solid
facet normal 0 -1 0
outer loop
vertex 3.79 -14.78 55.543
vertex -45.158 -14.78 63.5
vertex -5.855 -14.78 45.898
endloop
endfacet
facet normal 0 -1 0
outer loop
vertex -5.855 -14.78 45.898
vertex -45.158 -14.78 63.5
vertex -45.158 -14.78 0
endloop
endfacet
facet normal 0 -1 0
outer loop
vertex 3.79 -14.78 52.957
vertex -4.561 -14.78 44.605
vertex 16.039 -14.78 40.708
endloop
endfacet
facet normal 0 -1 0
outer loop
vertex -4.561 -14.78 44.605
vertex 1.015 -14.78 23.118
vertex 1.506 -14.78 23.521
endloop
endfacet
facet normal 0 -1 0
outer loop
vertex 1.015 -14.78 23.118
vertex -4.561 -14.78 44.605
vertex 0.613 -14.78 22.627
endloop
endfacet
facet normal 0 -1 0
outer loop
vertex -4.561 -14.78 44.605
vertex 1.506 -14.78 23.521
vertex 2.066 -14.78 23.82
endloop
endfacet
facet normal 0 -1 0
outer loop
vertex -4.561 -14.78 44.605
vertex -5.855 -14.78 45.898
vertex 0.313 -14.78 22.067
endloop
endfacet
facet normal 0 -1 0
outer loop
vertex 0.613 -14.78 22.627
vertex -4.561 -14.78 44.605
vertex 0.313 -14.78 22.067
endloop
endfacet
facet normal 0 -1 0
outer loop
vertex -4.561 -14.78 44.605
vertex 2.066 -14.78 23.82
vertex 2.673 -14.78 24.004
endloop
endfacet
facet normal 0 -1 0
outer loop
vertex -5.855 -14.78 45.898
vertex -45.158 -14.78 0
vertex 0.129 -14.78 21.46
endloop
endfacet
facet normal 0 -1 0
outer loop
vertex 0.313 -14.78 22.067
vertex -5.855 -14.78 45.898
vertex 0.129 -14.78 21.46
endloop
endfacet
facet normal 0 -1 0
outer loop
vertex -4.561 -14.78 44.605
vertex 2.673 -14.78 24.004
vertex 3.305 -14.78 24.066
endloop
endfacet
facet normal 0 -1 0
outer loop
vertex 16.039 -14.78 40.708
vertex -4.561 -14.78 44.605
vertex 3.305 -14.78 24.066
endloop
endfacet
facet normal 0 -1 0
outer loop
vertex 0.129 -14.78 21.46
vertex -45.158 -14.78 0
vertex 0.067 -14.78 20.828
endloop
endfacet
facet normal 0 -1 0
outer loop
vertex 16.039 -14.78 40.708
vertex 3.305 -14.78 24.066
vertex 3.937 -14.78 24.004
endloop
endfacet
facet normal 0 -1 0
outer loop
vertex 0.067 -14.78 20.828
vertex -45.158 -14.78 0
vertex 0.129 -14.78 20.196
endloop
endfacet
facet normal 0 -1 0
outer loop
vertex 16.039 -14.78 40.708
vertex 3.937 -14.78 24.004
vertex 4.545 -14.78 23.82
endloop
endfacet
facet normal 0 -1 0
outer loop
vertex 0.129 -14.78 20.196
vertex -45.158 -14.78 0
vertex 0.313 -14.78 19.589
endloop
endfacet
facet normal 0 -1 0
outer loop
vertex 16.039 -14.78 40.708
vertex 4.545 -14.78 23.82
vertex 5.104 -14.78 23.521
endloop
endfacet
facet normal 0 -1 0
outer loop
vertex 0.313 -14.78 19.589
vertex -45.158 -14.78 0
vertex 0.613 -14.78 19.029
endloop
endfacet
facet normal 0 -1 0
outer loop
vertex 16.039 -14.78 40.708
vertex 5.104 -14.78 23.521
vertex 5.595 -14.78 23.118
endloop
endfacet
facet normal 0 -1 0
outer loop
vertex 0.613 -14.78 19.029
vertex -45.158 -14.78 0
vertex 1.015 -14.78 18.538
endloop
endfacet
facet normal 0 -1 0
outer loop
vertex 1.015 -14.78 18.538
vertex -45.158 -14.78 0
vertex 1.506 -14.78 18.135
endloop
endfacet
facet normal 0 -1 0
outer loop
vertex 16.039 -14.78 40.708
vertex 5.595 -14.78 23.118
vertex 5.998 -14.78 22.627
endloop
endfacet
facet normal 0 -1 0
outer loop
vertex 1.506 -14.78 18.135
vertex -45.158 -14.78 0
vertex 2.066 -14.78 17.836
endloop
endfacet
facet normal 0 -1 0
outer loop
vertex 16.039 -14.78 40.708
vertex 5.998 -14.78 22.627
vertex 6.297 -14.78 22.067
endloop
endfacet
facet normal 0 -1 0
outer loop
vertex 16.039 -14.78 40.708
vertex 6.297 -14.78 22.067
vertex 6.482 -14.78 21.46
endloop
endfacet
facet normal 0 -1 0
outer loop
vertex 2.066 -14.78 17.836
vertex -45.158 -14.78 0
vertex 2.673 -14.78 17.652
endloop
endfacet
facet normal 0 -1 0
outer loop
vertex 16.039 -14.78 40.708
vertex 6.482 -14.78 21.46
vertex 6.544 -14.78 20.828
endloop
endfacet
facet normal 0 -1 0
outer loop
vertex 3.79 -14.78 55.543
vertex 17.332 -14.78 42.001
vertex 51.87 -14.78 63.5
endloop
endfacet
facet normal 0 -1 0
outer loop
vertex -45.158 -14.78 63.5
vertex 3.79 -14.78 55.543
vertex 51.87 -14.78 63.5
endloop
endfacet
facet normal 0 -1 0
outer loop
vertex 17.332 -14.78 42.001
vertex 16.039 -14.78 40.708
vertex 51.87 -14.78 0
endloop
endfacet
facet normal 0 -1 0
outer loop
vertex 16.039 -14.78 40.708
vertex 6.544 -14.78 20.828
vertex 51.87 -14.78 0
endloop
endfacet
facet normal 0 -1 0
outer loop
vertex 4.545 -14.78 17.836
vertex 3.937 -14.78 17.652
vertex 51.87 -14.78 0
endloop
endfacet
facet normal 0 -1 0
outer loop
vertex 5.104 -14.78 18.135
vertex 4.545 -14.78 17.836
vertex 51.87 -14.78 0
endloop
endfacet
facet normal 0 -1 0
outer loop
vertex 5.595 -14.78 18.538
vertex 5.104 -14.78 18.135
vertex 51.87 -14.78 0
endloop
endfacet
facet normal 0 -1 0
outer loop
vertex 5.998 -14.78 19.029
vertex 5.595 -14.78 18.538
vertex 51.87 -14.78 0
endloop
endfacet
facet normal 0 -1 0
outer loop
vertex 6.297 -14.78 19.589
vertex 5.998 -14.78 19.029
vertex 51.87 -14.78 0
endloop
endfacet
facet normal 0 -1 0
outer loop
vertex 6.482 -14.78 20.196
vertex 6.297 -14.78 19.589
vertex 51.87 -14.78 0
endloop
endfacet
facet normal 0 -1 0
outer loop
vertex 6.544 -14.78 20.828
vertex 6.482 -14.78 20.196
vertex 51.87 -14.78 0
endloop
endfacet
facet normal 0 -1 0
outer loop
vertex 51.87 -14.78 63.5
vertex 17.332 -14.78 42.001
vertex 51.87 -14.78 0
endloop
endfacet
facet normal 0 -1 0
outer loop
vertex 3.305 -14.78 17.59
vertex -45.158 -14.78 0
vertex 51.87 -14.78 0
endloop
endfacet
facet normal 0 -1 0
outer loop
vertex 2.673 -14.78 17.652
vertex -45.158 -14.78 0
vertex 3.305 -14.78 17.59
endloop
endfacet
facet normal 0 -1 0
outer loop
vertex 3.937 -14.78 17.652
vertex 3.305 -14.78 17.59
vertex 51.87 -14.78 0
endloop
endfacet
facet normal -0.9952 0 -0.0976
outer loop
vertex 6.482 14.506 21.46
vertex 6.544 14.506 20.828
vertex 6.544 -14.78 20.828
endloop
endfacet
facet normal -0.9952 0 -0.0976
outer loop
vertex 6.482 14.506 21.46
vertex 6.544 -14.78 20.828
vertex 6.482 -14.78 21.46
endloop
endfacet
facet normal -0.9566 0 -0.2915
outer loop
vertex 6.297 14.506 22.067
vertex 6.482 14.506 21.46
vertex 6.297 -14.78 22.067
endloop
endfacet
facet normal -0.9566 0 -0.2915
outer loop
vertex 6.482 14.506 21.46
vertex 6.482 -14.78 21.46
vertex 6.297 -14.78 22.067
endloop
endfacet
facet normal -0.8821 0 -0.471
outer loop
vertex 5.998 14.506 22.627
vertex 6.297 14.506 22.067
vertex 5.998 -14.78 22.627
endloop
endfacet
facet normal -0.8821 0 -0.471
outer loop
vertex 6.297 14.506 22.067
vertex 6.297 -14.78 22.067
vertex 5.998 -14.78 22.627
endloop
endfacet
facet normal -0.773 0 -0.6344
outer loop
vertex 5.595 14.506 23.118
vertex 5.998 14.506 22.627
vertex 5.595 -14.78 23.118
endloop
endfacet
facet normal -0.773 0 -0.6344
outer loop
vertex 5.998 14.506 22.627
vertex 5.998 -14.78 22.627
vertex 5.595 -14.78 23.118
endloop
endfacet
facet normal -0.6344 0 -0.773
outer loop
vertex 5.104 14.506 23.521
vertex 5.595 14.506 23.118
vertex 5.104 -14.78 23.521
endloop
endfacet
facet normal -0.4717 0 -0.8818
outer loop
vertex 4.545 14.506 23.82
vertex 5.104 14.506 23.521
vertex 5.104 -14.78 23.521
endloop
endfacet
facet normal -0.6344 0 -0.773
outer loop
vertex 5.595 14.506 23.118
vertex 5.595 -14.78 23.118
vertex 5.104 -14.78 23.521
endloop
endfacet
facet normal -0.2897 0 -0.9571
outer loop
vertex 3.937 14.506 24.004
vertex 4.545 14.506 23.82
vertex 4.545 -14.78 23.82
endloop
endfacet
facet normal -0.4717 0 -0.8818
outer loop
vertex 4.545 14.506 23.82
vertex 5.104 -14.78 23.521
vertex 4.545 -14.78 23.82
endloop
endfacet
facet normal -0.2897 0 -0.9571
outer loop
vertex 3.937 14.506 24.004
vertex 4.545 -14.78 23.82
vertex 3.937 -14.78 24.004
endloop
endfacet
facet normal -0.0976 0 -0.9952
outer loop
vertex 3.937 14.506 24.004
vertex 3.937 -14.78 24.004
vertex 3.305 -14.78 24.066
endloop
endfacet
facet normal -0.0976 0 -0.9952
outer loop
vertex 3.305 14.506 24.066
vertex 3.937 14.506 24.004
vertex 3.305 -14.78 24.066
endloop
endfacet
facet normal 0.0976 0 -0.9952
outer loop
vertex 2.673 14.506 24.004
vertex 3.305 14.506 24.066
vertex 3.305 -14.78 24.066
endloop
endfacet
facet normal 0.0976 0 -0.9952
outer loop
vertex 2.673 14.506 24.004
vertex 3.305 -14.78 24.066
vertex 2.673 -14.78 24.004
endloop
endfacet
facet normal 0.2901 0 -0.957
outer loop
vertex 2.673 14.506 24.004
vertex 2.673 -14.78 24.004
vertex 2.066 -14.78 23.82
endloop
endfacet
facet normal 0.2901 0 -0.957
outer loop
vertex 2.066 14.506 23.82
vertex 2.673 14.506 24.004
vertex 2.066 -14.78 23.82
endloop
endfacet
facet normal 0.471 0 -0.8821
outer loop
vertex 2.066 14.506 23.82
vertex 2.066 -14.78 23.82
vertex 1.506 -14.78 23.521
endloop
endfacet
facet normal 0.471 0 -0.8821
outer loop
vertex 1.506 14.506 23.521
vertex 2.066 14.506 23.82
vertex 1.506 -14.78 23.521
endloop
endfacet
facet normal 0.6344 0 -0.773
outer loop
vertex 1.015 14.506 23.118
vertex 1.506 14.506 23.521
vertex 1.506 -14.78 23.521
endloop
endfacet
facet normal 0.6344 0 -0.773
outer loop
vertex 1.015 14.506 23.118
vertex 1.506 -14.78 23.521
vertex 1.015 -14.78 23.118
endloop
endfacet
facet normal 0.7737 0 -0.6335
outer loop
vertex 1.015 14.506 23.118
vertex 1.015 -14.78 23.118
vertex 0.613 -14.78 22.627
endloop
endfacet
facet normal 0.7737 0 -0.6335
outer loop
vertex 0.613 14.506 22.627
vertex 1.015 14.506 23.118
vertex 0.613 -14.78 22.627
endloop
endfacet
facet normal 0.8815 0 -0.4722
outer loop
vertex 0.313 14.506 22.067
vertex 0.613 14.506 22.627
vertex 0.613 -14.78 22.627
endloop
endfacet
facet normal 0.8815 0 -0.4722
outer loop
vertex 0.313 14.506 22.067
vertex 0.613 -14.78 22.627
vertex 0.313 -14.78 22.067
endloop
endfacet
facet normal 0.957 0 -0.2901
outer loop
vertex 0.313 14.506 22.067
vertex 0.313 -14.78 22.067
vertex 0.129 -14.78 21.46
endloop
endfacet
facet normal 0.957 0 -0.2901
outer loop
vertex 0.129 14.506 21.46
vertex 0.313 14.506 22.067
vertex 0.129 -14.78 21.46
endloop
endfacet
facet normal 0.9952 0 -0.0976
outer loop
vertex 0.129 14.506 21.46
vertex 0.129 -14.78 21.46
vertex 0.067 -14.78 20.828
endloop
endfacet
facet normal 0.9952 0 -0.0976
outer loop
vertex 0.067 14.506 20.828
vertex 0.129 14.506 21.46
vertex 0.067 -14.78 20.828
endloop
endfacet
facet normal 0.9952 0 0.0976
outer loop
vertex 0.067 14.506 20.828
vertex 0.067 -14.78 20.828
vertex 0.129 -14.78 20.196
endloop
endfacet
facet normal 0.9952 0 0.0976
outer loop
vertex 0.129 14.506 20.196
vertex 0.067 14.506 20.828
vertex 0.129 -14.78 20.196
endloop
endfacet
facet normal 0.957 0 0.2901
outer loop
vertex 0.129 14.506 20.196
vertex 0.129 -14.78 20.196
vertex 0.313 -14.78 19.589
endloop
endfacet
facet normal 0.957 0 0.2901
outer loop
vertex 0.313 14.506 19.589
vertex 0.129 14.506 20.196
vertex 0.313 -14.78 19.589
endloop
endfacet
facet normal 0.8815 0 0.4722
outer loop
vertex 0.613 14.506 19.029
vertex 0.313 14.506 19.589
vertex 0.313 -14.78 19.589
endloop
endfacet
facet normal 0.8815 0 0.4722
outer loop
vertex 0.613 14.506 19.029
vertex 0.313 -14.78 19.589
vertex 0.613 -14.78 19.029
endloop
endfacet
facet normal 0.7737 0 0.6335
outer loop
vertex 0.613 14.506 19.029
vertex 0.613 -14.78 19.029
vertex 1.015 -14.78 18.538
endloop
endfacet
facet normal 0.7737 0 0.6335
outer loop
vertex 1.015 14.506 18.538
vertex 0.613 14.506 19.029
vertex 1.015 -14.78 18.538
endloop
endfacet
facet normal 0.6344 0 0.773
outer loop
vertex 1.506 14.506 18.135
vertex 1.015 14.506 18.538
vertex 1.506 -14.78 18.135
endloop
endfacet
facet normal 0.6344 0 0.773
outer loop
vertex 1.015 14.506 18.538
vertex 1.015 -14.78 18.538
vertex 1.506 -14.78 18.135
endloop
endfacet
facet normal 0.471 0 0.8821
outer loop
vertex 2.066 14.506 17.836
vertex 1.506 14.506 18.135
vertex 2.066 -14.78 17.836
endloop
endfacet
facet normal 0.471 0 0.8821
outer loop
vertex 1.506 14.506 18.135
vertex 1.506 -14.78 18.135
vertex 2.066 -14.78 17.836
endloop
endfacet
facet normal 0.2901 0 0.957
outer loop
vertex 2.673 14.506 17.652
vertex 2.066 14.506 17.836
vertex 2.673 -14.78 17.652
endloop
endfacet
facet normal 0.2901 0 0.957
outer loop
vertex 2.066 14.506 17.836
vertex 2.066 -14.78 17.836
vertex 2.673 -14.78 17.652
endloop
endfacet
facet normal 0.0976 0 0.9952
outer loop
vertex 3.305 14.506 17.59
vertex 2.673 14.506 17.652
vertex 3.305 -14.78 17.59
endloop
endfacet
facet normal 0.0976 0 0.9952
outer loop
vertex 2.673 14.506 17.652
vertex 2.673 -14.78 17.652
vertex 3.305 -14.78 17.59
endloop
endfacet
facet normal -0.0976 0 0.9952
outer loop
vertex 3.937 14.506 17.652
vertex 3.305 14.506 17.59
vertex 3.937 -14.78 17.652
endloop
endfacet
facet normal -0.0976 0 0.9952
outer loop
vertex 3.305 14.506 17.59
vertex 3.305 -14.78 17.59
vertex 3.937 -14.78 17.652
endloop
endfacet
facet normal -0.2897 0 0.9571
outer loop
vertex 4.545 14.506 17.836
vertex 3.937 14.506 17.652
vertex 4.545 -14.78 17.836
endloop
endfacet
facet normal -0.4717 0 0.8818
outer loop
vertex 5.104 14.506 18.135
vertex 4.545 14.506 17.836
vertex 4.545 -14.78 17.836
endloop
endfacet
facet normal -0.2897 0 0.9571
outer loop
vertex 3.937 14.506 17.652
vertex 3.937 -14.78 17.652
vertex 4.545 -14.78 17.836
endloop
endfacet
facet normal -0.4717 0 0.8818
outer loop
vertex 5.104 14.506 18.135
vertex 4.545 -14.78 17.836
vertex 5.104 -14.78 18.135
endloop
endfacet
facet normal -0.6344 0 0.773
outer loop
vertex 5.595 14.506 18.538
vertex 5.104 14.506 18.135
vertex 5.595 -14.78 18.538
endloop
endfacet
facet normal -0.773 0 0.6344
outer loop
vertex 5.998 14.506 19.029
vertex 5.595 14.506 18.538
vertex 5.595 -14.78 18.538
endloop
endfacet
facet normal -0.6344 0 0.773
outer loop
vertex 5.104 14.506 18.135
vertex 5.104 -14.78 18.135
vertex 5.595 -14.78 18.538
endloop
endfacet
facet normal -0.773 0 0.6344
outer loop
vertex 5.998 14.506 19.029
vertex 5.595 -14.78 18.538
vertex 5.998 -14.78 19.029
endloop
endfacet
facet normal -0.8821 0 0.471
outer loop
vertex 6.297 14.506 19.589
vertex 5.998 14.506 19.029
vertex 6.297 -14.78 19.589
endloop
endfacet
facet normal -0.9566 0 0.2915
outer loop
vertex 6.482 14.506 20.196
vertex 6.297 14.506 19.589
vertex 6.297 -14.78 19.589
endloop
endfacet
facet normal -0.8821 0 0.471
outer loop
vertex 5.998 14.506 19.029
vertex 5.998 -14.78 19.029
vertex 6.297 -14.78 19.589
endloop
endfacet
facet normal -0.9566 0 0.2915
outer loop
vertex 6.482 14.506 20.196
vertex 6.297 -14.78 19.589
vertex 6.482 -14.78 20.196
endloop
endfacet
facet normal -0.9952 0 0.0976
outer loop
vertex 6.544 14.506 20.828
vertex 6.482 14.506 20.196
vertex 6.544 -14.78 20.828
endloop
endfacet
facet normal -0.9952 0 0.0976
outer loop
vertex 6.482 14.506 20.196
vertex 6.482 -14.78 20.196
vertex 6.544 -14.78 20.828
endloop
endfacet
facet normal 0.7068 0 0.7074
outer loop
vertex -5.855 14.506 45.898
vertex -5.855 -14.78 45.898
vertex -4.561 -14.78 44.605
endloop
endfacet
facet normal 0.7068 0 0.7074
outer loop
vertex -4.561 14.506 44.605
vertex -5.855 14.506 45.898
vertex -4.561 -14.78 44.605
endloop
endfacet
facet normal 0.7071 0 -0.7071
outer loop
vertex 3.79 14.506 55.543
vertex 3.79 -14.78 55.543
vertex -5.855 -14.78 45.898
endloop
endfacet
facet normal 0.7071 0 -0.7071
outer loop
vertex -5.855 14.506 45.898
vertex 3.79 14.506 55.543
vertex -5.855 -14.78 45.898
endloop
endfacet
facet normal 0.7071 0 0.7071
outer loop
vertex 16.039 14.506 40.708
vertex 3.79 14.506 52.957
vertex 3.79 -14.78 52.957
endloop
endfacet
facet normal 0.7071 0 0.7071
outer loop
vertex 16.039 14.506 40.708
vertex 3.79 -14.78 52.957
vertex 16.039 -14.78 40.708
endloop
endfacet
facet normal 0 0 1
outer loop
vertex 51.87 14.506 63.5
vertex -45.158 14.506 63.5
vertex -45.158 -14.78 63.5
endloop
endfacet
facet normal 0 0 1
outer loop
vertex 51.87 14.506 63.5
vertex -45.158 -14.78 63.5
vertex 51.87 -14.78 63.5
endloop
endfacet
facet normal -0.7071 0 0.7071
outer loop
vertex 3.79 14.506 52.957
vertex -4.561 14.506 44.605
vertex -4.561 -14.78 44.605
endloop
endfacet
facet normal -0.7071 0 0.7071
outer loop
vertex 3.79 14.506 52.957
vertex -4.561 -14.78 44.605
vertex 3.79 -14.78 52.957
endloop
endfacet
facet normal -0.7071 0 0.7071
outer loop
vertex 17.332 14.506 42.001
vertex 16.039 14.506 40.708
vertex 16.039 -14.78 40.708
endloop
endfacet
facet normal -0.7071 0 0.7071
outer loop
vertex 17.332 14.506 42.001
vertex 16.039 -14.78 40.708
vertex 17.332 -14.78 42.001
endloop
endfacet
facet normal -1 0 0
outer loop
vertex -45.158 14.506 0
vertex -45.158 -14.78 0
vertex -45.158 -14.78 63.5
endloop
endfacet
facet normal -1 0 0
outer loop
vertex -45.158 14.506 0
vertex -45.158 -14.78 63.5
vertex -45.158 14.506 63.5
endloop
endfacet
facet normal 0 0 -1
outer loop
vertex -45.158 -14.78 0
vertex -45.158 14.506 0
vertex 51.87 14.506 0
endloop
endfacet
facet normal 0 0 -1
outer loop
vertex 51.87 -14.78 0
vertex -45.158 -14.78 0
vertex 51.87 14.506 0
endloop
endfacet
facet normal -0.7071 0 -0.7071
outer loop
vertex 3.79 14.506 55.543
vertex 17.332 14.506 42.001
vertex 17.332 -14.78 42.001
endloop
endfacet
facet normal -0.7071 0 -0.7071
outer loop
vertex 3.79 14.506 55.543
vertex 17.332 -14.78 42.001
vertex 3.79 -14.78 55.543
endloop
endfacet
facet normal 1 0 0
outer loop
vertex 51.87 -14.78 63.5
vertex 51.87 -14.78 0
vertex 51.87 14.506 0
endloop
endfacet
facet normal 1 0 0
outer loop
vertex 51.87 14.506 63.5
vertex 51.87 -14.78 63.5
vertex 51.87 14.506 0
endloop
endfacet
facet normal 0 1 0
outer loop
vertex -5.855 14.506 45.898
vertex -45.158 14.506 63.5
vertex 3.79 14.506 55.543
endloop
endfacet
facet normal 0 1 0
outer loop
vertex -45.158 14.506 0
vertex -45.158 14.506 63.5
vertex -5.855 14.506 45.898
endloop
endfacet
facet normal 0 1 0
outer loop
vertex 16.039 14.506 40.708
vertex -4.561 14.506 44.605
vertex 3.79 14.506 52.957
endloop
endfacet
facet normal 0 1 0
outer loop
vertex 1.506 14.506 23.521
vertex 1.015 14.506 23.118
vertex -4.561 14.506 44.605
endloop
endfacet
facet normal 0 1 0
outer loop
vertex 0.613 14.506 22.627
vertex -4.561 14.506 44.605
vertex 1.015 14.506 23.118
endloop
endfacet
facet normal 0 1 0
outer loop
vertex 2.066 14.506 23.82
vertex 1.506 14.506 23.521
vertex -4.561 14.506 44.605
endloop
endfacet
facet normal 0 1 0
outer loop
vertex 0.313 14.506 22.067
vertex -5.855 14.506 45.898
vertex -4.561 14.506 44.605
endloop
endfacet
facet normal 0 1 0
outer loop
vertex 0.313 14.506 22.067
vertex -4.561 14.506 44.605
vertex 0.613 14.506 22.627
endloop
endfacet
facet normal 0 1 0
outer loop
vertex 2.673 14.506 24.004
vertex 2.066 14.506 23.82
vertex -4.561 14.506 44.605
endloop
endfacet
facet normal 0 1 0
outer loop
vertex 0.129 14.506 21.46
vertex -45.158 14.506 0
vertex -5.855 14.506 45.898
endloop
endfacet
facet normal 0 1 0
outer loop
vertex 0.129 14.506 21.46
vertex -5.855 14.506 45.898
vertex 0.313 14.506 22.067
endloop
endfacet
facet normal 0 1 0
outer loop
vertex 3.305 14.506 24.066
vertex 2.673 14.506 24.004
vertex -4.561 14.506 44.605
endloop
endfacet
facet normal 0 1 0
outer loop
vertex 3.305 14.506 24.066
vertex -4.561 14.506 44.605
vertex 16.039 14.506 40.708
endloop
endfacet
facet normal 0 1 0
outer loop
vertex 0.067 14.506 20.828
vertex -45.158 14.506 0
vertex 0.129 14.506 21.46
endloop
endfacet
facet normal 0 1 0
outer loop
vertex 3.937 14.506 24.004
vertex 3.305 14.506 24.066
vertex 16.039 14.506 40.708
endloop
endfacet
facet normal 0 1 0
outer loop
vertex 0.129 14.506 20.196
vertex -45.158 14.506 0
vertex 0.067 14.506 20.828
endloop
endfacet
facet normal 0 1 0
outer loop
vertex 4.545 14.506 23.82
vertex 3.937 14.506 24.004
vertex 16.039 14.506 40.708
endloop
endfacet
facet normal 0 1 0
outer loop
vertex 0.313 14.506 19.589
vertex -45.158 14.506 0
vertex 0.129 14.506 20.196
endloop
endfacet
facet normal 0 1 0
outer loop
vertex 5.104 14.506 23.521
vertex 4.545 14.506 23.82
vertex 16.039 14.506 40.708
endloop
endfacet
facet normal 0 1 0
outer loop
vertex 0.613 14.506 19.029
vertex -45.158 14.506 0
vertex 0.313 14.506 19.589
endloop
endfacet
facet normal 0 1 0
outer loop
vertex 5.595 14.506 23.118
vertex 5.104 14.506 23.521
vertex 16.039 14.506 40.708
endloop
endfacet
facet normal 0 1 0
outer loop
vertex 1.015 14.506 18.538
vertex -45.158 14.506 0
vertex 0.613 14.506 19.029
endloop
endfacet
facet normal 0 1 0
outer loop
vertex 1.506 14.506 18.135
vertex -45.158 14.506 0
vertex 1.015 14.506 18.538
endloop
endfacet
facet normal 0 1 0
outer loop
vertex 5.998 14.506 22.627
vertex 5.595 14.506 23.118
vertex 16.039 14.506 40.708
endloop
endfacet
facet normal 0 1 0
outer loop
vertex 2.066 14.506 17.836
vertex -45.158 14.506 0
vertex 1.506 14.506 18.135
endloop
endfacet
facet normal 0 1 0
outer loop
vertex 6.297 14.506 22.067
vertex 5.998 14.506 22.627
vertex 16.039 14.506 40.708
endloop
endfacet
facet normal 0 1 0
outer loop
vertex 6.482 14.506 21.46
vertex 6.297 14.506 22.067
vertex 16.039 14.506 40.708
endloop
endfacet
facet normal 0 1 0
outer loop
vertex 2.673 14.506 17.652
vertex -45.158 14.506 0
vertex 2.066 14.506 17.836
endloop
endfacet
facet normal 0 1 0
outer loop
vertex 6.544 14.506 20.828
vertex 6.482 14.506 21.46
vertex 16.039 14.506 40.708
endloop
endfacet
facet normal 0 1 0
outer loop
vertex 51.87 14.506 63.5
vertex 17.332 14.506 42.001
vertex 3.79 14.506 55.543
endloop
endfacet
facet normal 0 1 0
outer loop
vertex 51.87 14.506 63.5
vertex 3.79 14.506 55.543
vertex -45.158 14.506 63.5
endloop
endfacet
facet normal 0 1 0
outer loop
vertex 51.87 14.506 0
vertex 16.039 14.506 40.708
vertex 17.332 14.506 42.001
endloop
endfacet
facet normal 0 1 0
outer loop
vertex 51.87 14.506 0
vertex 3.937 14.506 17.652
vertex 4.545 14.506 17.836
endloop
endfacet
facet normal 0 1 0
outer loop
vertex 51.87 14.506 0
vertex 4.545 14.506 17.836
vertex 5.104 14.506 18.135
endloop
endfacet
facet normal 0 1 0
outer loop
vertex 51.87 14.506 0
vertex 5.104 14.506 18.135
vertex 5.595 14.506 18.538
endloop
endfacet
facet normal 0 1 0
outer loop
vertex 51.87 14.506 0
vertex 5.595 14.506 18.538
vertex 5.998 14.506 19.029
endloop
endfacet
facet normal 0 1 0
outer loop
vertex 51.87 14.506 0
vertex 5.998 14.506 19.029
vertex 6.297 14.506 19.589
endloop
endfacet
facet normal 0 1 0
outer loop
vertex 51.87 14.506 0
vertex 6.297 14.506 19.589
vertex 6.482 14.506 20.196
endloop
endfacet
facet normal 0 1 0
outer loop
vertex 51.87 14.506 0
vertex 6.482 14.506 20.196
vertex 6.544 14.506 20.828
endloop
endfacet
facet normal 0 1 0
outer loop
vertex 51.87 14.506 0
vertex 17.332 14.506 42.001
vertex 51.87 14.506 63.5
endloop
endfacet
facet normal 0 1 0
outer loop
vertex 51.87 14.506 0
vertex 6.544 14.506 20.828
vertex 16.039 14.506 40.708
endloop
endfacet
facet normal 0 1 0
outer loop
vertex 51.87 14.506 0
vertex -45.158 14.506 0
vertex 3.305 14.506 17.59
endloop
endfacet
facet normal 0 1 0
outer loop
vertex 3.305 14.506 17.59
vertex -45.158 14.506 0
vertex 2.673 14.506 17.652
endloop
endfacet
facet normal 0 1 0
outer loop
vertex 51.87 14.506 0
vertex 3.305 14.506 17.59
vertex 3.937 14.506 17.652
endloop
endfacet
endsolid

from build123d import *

# Parameters (mm, degrees)
F0_W     = 97.028
F0_H     = 29.2862
F1_DEPTH = 63.5
F2_R     = 3.2385
F3_DEPTH = 50.8
F5_DEPTH = 50.8


with BuildPart() as f1:
    # F0 (on Top) → F1 (new body)
    with BuildSketch(Plane.XY):
        with Locations((3.356052, -0.137089)):
            Rectangle(F0_W, F0_H)
    extrude(amount=F1_DEPTH)

    # F2 (on face) → F3 (cut)
    with BuildSketch(Plane.XZ.offset(14.780189)):
        with Locations((3.305252, 20.828)):
            Circle(F2_R)
    extrude(amount=-F3_DEPTH, mode=Mode.SUBTRACT)

    # F4 (on face) → F5 (cut)
    with BuildSketch(Plane.XZ.offset(14.780189)):
        Polygon((17.332412, 42.000698), (3.790186, 55.542924), (-5.854609, 45.898129), (-4.561452, 44.604972), (3.790186, 52.95661), (16.039255, 40.707541), align=None)
    extrude(amount=-F5_DEPTH, mode=Mode.SUBTRACT)


solid = f1.part
